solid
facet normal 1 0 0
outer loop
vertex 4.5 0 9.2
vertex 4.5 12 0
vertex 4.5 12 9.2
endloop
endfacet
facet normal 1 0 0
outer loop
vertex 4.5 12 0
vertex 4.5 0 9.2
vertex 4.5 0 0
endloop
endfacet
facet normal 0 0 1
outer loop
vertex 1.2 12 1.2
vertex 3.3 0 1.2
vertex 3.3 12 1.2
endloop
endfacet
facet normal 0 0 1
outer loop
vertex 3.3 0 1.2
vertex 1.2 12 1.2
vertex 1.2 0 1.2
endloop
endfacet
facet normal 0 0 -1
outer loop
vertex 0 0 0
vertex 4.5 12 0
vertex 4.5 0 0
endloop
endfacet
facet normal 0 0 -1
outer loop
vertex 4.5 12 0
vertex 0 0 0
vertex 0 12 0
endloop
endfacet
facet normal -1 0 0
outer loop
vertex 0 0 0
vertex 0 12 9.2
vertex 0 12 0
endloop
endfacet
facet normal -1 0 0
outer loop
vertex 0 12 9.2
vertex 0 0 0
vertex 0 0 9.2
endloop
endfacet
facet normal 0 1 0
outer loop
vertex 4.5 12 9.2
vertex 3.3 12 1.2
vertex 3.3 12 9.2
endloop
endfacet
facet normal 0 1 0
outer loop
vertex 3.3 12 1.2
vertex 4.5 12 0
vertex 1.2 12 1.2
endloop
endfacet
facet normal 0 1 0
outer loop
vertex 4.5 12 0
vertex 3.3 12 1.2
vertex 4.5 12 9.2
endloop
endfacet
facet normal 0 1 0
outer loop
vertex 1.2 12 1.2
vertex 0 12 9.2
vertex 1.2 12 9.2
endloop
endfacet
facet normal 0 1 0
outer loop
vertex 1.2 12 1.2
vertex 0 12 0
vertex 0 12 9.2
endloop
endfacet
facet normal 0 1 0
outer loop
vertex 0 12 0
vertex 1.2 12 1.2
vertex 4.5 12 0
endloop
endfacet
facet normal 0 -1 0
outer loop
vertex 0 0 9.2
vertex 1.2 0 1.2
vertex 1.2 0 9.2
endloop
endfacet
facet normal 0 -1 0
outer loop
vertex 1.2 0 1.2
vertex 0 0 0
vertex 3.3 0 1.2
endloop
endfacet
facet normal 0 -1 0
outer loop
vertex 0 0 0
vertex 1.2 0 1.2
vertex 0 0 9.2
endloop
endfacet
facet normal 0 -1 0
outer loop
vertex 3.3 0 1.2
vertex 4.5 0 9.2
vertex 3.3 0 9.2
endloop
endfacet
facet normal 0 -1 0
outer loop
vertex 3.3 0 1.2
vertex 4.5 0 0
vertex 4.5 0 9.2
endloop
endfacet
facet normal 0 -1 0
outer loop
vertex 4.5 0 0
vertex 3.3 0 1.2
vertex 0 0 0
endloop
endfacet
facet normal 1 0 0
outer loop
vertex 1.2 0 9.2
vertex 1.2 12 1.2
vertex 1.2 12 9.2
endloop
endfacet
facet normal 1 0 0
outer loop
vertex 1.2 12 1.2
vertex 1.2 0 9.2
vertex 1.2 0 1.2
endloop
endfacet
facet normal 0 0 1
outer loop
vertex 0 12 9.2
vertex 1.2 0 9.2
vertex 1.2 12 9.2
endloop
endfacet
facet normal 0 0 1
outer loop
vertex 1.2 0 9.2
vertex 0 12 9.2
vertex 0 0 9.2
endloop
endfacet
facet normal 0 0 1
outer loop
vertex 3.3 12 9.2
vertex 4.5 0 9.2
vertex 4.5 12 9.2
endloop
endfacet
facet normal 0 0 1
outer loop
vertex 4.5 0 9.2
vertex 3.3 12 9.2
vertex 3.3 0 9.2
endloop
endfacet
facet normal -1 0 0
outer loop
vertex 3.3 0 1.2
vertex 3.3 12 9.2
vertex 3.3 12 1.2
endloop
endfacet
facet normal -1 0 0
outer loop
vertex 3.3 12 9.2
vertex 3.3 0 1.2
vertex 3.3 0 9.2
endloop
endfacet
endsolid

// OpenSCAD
/*
 Simple cover to disable a USB port that has been damaged.
 */

XDim = 4.5;
YDim = 12;
ZDim = 8;
Width = 1.2;

cube([XDim, YDim, Width]);
translate([0,0,Width]) {
  cube([Width, YDim, ZDim]);
}
translate([XDim - Width, 0, Width]) {
  cube([ Width, YDim, ZDim]);
}
